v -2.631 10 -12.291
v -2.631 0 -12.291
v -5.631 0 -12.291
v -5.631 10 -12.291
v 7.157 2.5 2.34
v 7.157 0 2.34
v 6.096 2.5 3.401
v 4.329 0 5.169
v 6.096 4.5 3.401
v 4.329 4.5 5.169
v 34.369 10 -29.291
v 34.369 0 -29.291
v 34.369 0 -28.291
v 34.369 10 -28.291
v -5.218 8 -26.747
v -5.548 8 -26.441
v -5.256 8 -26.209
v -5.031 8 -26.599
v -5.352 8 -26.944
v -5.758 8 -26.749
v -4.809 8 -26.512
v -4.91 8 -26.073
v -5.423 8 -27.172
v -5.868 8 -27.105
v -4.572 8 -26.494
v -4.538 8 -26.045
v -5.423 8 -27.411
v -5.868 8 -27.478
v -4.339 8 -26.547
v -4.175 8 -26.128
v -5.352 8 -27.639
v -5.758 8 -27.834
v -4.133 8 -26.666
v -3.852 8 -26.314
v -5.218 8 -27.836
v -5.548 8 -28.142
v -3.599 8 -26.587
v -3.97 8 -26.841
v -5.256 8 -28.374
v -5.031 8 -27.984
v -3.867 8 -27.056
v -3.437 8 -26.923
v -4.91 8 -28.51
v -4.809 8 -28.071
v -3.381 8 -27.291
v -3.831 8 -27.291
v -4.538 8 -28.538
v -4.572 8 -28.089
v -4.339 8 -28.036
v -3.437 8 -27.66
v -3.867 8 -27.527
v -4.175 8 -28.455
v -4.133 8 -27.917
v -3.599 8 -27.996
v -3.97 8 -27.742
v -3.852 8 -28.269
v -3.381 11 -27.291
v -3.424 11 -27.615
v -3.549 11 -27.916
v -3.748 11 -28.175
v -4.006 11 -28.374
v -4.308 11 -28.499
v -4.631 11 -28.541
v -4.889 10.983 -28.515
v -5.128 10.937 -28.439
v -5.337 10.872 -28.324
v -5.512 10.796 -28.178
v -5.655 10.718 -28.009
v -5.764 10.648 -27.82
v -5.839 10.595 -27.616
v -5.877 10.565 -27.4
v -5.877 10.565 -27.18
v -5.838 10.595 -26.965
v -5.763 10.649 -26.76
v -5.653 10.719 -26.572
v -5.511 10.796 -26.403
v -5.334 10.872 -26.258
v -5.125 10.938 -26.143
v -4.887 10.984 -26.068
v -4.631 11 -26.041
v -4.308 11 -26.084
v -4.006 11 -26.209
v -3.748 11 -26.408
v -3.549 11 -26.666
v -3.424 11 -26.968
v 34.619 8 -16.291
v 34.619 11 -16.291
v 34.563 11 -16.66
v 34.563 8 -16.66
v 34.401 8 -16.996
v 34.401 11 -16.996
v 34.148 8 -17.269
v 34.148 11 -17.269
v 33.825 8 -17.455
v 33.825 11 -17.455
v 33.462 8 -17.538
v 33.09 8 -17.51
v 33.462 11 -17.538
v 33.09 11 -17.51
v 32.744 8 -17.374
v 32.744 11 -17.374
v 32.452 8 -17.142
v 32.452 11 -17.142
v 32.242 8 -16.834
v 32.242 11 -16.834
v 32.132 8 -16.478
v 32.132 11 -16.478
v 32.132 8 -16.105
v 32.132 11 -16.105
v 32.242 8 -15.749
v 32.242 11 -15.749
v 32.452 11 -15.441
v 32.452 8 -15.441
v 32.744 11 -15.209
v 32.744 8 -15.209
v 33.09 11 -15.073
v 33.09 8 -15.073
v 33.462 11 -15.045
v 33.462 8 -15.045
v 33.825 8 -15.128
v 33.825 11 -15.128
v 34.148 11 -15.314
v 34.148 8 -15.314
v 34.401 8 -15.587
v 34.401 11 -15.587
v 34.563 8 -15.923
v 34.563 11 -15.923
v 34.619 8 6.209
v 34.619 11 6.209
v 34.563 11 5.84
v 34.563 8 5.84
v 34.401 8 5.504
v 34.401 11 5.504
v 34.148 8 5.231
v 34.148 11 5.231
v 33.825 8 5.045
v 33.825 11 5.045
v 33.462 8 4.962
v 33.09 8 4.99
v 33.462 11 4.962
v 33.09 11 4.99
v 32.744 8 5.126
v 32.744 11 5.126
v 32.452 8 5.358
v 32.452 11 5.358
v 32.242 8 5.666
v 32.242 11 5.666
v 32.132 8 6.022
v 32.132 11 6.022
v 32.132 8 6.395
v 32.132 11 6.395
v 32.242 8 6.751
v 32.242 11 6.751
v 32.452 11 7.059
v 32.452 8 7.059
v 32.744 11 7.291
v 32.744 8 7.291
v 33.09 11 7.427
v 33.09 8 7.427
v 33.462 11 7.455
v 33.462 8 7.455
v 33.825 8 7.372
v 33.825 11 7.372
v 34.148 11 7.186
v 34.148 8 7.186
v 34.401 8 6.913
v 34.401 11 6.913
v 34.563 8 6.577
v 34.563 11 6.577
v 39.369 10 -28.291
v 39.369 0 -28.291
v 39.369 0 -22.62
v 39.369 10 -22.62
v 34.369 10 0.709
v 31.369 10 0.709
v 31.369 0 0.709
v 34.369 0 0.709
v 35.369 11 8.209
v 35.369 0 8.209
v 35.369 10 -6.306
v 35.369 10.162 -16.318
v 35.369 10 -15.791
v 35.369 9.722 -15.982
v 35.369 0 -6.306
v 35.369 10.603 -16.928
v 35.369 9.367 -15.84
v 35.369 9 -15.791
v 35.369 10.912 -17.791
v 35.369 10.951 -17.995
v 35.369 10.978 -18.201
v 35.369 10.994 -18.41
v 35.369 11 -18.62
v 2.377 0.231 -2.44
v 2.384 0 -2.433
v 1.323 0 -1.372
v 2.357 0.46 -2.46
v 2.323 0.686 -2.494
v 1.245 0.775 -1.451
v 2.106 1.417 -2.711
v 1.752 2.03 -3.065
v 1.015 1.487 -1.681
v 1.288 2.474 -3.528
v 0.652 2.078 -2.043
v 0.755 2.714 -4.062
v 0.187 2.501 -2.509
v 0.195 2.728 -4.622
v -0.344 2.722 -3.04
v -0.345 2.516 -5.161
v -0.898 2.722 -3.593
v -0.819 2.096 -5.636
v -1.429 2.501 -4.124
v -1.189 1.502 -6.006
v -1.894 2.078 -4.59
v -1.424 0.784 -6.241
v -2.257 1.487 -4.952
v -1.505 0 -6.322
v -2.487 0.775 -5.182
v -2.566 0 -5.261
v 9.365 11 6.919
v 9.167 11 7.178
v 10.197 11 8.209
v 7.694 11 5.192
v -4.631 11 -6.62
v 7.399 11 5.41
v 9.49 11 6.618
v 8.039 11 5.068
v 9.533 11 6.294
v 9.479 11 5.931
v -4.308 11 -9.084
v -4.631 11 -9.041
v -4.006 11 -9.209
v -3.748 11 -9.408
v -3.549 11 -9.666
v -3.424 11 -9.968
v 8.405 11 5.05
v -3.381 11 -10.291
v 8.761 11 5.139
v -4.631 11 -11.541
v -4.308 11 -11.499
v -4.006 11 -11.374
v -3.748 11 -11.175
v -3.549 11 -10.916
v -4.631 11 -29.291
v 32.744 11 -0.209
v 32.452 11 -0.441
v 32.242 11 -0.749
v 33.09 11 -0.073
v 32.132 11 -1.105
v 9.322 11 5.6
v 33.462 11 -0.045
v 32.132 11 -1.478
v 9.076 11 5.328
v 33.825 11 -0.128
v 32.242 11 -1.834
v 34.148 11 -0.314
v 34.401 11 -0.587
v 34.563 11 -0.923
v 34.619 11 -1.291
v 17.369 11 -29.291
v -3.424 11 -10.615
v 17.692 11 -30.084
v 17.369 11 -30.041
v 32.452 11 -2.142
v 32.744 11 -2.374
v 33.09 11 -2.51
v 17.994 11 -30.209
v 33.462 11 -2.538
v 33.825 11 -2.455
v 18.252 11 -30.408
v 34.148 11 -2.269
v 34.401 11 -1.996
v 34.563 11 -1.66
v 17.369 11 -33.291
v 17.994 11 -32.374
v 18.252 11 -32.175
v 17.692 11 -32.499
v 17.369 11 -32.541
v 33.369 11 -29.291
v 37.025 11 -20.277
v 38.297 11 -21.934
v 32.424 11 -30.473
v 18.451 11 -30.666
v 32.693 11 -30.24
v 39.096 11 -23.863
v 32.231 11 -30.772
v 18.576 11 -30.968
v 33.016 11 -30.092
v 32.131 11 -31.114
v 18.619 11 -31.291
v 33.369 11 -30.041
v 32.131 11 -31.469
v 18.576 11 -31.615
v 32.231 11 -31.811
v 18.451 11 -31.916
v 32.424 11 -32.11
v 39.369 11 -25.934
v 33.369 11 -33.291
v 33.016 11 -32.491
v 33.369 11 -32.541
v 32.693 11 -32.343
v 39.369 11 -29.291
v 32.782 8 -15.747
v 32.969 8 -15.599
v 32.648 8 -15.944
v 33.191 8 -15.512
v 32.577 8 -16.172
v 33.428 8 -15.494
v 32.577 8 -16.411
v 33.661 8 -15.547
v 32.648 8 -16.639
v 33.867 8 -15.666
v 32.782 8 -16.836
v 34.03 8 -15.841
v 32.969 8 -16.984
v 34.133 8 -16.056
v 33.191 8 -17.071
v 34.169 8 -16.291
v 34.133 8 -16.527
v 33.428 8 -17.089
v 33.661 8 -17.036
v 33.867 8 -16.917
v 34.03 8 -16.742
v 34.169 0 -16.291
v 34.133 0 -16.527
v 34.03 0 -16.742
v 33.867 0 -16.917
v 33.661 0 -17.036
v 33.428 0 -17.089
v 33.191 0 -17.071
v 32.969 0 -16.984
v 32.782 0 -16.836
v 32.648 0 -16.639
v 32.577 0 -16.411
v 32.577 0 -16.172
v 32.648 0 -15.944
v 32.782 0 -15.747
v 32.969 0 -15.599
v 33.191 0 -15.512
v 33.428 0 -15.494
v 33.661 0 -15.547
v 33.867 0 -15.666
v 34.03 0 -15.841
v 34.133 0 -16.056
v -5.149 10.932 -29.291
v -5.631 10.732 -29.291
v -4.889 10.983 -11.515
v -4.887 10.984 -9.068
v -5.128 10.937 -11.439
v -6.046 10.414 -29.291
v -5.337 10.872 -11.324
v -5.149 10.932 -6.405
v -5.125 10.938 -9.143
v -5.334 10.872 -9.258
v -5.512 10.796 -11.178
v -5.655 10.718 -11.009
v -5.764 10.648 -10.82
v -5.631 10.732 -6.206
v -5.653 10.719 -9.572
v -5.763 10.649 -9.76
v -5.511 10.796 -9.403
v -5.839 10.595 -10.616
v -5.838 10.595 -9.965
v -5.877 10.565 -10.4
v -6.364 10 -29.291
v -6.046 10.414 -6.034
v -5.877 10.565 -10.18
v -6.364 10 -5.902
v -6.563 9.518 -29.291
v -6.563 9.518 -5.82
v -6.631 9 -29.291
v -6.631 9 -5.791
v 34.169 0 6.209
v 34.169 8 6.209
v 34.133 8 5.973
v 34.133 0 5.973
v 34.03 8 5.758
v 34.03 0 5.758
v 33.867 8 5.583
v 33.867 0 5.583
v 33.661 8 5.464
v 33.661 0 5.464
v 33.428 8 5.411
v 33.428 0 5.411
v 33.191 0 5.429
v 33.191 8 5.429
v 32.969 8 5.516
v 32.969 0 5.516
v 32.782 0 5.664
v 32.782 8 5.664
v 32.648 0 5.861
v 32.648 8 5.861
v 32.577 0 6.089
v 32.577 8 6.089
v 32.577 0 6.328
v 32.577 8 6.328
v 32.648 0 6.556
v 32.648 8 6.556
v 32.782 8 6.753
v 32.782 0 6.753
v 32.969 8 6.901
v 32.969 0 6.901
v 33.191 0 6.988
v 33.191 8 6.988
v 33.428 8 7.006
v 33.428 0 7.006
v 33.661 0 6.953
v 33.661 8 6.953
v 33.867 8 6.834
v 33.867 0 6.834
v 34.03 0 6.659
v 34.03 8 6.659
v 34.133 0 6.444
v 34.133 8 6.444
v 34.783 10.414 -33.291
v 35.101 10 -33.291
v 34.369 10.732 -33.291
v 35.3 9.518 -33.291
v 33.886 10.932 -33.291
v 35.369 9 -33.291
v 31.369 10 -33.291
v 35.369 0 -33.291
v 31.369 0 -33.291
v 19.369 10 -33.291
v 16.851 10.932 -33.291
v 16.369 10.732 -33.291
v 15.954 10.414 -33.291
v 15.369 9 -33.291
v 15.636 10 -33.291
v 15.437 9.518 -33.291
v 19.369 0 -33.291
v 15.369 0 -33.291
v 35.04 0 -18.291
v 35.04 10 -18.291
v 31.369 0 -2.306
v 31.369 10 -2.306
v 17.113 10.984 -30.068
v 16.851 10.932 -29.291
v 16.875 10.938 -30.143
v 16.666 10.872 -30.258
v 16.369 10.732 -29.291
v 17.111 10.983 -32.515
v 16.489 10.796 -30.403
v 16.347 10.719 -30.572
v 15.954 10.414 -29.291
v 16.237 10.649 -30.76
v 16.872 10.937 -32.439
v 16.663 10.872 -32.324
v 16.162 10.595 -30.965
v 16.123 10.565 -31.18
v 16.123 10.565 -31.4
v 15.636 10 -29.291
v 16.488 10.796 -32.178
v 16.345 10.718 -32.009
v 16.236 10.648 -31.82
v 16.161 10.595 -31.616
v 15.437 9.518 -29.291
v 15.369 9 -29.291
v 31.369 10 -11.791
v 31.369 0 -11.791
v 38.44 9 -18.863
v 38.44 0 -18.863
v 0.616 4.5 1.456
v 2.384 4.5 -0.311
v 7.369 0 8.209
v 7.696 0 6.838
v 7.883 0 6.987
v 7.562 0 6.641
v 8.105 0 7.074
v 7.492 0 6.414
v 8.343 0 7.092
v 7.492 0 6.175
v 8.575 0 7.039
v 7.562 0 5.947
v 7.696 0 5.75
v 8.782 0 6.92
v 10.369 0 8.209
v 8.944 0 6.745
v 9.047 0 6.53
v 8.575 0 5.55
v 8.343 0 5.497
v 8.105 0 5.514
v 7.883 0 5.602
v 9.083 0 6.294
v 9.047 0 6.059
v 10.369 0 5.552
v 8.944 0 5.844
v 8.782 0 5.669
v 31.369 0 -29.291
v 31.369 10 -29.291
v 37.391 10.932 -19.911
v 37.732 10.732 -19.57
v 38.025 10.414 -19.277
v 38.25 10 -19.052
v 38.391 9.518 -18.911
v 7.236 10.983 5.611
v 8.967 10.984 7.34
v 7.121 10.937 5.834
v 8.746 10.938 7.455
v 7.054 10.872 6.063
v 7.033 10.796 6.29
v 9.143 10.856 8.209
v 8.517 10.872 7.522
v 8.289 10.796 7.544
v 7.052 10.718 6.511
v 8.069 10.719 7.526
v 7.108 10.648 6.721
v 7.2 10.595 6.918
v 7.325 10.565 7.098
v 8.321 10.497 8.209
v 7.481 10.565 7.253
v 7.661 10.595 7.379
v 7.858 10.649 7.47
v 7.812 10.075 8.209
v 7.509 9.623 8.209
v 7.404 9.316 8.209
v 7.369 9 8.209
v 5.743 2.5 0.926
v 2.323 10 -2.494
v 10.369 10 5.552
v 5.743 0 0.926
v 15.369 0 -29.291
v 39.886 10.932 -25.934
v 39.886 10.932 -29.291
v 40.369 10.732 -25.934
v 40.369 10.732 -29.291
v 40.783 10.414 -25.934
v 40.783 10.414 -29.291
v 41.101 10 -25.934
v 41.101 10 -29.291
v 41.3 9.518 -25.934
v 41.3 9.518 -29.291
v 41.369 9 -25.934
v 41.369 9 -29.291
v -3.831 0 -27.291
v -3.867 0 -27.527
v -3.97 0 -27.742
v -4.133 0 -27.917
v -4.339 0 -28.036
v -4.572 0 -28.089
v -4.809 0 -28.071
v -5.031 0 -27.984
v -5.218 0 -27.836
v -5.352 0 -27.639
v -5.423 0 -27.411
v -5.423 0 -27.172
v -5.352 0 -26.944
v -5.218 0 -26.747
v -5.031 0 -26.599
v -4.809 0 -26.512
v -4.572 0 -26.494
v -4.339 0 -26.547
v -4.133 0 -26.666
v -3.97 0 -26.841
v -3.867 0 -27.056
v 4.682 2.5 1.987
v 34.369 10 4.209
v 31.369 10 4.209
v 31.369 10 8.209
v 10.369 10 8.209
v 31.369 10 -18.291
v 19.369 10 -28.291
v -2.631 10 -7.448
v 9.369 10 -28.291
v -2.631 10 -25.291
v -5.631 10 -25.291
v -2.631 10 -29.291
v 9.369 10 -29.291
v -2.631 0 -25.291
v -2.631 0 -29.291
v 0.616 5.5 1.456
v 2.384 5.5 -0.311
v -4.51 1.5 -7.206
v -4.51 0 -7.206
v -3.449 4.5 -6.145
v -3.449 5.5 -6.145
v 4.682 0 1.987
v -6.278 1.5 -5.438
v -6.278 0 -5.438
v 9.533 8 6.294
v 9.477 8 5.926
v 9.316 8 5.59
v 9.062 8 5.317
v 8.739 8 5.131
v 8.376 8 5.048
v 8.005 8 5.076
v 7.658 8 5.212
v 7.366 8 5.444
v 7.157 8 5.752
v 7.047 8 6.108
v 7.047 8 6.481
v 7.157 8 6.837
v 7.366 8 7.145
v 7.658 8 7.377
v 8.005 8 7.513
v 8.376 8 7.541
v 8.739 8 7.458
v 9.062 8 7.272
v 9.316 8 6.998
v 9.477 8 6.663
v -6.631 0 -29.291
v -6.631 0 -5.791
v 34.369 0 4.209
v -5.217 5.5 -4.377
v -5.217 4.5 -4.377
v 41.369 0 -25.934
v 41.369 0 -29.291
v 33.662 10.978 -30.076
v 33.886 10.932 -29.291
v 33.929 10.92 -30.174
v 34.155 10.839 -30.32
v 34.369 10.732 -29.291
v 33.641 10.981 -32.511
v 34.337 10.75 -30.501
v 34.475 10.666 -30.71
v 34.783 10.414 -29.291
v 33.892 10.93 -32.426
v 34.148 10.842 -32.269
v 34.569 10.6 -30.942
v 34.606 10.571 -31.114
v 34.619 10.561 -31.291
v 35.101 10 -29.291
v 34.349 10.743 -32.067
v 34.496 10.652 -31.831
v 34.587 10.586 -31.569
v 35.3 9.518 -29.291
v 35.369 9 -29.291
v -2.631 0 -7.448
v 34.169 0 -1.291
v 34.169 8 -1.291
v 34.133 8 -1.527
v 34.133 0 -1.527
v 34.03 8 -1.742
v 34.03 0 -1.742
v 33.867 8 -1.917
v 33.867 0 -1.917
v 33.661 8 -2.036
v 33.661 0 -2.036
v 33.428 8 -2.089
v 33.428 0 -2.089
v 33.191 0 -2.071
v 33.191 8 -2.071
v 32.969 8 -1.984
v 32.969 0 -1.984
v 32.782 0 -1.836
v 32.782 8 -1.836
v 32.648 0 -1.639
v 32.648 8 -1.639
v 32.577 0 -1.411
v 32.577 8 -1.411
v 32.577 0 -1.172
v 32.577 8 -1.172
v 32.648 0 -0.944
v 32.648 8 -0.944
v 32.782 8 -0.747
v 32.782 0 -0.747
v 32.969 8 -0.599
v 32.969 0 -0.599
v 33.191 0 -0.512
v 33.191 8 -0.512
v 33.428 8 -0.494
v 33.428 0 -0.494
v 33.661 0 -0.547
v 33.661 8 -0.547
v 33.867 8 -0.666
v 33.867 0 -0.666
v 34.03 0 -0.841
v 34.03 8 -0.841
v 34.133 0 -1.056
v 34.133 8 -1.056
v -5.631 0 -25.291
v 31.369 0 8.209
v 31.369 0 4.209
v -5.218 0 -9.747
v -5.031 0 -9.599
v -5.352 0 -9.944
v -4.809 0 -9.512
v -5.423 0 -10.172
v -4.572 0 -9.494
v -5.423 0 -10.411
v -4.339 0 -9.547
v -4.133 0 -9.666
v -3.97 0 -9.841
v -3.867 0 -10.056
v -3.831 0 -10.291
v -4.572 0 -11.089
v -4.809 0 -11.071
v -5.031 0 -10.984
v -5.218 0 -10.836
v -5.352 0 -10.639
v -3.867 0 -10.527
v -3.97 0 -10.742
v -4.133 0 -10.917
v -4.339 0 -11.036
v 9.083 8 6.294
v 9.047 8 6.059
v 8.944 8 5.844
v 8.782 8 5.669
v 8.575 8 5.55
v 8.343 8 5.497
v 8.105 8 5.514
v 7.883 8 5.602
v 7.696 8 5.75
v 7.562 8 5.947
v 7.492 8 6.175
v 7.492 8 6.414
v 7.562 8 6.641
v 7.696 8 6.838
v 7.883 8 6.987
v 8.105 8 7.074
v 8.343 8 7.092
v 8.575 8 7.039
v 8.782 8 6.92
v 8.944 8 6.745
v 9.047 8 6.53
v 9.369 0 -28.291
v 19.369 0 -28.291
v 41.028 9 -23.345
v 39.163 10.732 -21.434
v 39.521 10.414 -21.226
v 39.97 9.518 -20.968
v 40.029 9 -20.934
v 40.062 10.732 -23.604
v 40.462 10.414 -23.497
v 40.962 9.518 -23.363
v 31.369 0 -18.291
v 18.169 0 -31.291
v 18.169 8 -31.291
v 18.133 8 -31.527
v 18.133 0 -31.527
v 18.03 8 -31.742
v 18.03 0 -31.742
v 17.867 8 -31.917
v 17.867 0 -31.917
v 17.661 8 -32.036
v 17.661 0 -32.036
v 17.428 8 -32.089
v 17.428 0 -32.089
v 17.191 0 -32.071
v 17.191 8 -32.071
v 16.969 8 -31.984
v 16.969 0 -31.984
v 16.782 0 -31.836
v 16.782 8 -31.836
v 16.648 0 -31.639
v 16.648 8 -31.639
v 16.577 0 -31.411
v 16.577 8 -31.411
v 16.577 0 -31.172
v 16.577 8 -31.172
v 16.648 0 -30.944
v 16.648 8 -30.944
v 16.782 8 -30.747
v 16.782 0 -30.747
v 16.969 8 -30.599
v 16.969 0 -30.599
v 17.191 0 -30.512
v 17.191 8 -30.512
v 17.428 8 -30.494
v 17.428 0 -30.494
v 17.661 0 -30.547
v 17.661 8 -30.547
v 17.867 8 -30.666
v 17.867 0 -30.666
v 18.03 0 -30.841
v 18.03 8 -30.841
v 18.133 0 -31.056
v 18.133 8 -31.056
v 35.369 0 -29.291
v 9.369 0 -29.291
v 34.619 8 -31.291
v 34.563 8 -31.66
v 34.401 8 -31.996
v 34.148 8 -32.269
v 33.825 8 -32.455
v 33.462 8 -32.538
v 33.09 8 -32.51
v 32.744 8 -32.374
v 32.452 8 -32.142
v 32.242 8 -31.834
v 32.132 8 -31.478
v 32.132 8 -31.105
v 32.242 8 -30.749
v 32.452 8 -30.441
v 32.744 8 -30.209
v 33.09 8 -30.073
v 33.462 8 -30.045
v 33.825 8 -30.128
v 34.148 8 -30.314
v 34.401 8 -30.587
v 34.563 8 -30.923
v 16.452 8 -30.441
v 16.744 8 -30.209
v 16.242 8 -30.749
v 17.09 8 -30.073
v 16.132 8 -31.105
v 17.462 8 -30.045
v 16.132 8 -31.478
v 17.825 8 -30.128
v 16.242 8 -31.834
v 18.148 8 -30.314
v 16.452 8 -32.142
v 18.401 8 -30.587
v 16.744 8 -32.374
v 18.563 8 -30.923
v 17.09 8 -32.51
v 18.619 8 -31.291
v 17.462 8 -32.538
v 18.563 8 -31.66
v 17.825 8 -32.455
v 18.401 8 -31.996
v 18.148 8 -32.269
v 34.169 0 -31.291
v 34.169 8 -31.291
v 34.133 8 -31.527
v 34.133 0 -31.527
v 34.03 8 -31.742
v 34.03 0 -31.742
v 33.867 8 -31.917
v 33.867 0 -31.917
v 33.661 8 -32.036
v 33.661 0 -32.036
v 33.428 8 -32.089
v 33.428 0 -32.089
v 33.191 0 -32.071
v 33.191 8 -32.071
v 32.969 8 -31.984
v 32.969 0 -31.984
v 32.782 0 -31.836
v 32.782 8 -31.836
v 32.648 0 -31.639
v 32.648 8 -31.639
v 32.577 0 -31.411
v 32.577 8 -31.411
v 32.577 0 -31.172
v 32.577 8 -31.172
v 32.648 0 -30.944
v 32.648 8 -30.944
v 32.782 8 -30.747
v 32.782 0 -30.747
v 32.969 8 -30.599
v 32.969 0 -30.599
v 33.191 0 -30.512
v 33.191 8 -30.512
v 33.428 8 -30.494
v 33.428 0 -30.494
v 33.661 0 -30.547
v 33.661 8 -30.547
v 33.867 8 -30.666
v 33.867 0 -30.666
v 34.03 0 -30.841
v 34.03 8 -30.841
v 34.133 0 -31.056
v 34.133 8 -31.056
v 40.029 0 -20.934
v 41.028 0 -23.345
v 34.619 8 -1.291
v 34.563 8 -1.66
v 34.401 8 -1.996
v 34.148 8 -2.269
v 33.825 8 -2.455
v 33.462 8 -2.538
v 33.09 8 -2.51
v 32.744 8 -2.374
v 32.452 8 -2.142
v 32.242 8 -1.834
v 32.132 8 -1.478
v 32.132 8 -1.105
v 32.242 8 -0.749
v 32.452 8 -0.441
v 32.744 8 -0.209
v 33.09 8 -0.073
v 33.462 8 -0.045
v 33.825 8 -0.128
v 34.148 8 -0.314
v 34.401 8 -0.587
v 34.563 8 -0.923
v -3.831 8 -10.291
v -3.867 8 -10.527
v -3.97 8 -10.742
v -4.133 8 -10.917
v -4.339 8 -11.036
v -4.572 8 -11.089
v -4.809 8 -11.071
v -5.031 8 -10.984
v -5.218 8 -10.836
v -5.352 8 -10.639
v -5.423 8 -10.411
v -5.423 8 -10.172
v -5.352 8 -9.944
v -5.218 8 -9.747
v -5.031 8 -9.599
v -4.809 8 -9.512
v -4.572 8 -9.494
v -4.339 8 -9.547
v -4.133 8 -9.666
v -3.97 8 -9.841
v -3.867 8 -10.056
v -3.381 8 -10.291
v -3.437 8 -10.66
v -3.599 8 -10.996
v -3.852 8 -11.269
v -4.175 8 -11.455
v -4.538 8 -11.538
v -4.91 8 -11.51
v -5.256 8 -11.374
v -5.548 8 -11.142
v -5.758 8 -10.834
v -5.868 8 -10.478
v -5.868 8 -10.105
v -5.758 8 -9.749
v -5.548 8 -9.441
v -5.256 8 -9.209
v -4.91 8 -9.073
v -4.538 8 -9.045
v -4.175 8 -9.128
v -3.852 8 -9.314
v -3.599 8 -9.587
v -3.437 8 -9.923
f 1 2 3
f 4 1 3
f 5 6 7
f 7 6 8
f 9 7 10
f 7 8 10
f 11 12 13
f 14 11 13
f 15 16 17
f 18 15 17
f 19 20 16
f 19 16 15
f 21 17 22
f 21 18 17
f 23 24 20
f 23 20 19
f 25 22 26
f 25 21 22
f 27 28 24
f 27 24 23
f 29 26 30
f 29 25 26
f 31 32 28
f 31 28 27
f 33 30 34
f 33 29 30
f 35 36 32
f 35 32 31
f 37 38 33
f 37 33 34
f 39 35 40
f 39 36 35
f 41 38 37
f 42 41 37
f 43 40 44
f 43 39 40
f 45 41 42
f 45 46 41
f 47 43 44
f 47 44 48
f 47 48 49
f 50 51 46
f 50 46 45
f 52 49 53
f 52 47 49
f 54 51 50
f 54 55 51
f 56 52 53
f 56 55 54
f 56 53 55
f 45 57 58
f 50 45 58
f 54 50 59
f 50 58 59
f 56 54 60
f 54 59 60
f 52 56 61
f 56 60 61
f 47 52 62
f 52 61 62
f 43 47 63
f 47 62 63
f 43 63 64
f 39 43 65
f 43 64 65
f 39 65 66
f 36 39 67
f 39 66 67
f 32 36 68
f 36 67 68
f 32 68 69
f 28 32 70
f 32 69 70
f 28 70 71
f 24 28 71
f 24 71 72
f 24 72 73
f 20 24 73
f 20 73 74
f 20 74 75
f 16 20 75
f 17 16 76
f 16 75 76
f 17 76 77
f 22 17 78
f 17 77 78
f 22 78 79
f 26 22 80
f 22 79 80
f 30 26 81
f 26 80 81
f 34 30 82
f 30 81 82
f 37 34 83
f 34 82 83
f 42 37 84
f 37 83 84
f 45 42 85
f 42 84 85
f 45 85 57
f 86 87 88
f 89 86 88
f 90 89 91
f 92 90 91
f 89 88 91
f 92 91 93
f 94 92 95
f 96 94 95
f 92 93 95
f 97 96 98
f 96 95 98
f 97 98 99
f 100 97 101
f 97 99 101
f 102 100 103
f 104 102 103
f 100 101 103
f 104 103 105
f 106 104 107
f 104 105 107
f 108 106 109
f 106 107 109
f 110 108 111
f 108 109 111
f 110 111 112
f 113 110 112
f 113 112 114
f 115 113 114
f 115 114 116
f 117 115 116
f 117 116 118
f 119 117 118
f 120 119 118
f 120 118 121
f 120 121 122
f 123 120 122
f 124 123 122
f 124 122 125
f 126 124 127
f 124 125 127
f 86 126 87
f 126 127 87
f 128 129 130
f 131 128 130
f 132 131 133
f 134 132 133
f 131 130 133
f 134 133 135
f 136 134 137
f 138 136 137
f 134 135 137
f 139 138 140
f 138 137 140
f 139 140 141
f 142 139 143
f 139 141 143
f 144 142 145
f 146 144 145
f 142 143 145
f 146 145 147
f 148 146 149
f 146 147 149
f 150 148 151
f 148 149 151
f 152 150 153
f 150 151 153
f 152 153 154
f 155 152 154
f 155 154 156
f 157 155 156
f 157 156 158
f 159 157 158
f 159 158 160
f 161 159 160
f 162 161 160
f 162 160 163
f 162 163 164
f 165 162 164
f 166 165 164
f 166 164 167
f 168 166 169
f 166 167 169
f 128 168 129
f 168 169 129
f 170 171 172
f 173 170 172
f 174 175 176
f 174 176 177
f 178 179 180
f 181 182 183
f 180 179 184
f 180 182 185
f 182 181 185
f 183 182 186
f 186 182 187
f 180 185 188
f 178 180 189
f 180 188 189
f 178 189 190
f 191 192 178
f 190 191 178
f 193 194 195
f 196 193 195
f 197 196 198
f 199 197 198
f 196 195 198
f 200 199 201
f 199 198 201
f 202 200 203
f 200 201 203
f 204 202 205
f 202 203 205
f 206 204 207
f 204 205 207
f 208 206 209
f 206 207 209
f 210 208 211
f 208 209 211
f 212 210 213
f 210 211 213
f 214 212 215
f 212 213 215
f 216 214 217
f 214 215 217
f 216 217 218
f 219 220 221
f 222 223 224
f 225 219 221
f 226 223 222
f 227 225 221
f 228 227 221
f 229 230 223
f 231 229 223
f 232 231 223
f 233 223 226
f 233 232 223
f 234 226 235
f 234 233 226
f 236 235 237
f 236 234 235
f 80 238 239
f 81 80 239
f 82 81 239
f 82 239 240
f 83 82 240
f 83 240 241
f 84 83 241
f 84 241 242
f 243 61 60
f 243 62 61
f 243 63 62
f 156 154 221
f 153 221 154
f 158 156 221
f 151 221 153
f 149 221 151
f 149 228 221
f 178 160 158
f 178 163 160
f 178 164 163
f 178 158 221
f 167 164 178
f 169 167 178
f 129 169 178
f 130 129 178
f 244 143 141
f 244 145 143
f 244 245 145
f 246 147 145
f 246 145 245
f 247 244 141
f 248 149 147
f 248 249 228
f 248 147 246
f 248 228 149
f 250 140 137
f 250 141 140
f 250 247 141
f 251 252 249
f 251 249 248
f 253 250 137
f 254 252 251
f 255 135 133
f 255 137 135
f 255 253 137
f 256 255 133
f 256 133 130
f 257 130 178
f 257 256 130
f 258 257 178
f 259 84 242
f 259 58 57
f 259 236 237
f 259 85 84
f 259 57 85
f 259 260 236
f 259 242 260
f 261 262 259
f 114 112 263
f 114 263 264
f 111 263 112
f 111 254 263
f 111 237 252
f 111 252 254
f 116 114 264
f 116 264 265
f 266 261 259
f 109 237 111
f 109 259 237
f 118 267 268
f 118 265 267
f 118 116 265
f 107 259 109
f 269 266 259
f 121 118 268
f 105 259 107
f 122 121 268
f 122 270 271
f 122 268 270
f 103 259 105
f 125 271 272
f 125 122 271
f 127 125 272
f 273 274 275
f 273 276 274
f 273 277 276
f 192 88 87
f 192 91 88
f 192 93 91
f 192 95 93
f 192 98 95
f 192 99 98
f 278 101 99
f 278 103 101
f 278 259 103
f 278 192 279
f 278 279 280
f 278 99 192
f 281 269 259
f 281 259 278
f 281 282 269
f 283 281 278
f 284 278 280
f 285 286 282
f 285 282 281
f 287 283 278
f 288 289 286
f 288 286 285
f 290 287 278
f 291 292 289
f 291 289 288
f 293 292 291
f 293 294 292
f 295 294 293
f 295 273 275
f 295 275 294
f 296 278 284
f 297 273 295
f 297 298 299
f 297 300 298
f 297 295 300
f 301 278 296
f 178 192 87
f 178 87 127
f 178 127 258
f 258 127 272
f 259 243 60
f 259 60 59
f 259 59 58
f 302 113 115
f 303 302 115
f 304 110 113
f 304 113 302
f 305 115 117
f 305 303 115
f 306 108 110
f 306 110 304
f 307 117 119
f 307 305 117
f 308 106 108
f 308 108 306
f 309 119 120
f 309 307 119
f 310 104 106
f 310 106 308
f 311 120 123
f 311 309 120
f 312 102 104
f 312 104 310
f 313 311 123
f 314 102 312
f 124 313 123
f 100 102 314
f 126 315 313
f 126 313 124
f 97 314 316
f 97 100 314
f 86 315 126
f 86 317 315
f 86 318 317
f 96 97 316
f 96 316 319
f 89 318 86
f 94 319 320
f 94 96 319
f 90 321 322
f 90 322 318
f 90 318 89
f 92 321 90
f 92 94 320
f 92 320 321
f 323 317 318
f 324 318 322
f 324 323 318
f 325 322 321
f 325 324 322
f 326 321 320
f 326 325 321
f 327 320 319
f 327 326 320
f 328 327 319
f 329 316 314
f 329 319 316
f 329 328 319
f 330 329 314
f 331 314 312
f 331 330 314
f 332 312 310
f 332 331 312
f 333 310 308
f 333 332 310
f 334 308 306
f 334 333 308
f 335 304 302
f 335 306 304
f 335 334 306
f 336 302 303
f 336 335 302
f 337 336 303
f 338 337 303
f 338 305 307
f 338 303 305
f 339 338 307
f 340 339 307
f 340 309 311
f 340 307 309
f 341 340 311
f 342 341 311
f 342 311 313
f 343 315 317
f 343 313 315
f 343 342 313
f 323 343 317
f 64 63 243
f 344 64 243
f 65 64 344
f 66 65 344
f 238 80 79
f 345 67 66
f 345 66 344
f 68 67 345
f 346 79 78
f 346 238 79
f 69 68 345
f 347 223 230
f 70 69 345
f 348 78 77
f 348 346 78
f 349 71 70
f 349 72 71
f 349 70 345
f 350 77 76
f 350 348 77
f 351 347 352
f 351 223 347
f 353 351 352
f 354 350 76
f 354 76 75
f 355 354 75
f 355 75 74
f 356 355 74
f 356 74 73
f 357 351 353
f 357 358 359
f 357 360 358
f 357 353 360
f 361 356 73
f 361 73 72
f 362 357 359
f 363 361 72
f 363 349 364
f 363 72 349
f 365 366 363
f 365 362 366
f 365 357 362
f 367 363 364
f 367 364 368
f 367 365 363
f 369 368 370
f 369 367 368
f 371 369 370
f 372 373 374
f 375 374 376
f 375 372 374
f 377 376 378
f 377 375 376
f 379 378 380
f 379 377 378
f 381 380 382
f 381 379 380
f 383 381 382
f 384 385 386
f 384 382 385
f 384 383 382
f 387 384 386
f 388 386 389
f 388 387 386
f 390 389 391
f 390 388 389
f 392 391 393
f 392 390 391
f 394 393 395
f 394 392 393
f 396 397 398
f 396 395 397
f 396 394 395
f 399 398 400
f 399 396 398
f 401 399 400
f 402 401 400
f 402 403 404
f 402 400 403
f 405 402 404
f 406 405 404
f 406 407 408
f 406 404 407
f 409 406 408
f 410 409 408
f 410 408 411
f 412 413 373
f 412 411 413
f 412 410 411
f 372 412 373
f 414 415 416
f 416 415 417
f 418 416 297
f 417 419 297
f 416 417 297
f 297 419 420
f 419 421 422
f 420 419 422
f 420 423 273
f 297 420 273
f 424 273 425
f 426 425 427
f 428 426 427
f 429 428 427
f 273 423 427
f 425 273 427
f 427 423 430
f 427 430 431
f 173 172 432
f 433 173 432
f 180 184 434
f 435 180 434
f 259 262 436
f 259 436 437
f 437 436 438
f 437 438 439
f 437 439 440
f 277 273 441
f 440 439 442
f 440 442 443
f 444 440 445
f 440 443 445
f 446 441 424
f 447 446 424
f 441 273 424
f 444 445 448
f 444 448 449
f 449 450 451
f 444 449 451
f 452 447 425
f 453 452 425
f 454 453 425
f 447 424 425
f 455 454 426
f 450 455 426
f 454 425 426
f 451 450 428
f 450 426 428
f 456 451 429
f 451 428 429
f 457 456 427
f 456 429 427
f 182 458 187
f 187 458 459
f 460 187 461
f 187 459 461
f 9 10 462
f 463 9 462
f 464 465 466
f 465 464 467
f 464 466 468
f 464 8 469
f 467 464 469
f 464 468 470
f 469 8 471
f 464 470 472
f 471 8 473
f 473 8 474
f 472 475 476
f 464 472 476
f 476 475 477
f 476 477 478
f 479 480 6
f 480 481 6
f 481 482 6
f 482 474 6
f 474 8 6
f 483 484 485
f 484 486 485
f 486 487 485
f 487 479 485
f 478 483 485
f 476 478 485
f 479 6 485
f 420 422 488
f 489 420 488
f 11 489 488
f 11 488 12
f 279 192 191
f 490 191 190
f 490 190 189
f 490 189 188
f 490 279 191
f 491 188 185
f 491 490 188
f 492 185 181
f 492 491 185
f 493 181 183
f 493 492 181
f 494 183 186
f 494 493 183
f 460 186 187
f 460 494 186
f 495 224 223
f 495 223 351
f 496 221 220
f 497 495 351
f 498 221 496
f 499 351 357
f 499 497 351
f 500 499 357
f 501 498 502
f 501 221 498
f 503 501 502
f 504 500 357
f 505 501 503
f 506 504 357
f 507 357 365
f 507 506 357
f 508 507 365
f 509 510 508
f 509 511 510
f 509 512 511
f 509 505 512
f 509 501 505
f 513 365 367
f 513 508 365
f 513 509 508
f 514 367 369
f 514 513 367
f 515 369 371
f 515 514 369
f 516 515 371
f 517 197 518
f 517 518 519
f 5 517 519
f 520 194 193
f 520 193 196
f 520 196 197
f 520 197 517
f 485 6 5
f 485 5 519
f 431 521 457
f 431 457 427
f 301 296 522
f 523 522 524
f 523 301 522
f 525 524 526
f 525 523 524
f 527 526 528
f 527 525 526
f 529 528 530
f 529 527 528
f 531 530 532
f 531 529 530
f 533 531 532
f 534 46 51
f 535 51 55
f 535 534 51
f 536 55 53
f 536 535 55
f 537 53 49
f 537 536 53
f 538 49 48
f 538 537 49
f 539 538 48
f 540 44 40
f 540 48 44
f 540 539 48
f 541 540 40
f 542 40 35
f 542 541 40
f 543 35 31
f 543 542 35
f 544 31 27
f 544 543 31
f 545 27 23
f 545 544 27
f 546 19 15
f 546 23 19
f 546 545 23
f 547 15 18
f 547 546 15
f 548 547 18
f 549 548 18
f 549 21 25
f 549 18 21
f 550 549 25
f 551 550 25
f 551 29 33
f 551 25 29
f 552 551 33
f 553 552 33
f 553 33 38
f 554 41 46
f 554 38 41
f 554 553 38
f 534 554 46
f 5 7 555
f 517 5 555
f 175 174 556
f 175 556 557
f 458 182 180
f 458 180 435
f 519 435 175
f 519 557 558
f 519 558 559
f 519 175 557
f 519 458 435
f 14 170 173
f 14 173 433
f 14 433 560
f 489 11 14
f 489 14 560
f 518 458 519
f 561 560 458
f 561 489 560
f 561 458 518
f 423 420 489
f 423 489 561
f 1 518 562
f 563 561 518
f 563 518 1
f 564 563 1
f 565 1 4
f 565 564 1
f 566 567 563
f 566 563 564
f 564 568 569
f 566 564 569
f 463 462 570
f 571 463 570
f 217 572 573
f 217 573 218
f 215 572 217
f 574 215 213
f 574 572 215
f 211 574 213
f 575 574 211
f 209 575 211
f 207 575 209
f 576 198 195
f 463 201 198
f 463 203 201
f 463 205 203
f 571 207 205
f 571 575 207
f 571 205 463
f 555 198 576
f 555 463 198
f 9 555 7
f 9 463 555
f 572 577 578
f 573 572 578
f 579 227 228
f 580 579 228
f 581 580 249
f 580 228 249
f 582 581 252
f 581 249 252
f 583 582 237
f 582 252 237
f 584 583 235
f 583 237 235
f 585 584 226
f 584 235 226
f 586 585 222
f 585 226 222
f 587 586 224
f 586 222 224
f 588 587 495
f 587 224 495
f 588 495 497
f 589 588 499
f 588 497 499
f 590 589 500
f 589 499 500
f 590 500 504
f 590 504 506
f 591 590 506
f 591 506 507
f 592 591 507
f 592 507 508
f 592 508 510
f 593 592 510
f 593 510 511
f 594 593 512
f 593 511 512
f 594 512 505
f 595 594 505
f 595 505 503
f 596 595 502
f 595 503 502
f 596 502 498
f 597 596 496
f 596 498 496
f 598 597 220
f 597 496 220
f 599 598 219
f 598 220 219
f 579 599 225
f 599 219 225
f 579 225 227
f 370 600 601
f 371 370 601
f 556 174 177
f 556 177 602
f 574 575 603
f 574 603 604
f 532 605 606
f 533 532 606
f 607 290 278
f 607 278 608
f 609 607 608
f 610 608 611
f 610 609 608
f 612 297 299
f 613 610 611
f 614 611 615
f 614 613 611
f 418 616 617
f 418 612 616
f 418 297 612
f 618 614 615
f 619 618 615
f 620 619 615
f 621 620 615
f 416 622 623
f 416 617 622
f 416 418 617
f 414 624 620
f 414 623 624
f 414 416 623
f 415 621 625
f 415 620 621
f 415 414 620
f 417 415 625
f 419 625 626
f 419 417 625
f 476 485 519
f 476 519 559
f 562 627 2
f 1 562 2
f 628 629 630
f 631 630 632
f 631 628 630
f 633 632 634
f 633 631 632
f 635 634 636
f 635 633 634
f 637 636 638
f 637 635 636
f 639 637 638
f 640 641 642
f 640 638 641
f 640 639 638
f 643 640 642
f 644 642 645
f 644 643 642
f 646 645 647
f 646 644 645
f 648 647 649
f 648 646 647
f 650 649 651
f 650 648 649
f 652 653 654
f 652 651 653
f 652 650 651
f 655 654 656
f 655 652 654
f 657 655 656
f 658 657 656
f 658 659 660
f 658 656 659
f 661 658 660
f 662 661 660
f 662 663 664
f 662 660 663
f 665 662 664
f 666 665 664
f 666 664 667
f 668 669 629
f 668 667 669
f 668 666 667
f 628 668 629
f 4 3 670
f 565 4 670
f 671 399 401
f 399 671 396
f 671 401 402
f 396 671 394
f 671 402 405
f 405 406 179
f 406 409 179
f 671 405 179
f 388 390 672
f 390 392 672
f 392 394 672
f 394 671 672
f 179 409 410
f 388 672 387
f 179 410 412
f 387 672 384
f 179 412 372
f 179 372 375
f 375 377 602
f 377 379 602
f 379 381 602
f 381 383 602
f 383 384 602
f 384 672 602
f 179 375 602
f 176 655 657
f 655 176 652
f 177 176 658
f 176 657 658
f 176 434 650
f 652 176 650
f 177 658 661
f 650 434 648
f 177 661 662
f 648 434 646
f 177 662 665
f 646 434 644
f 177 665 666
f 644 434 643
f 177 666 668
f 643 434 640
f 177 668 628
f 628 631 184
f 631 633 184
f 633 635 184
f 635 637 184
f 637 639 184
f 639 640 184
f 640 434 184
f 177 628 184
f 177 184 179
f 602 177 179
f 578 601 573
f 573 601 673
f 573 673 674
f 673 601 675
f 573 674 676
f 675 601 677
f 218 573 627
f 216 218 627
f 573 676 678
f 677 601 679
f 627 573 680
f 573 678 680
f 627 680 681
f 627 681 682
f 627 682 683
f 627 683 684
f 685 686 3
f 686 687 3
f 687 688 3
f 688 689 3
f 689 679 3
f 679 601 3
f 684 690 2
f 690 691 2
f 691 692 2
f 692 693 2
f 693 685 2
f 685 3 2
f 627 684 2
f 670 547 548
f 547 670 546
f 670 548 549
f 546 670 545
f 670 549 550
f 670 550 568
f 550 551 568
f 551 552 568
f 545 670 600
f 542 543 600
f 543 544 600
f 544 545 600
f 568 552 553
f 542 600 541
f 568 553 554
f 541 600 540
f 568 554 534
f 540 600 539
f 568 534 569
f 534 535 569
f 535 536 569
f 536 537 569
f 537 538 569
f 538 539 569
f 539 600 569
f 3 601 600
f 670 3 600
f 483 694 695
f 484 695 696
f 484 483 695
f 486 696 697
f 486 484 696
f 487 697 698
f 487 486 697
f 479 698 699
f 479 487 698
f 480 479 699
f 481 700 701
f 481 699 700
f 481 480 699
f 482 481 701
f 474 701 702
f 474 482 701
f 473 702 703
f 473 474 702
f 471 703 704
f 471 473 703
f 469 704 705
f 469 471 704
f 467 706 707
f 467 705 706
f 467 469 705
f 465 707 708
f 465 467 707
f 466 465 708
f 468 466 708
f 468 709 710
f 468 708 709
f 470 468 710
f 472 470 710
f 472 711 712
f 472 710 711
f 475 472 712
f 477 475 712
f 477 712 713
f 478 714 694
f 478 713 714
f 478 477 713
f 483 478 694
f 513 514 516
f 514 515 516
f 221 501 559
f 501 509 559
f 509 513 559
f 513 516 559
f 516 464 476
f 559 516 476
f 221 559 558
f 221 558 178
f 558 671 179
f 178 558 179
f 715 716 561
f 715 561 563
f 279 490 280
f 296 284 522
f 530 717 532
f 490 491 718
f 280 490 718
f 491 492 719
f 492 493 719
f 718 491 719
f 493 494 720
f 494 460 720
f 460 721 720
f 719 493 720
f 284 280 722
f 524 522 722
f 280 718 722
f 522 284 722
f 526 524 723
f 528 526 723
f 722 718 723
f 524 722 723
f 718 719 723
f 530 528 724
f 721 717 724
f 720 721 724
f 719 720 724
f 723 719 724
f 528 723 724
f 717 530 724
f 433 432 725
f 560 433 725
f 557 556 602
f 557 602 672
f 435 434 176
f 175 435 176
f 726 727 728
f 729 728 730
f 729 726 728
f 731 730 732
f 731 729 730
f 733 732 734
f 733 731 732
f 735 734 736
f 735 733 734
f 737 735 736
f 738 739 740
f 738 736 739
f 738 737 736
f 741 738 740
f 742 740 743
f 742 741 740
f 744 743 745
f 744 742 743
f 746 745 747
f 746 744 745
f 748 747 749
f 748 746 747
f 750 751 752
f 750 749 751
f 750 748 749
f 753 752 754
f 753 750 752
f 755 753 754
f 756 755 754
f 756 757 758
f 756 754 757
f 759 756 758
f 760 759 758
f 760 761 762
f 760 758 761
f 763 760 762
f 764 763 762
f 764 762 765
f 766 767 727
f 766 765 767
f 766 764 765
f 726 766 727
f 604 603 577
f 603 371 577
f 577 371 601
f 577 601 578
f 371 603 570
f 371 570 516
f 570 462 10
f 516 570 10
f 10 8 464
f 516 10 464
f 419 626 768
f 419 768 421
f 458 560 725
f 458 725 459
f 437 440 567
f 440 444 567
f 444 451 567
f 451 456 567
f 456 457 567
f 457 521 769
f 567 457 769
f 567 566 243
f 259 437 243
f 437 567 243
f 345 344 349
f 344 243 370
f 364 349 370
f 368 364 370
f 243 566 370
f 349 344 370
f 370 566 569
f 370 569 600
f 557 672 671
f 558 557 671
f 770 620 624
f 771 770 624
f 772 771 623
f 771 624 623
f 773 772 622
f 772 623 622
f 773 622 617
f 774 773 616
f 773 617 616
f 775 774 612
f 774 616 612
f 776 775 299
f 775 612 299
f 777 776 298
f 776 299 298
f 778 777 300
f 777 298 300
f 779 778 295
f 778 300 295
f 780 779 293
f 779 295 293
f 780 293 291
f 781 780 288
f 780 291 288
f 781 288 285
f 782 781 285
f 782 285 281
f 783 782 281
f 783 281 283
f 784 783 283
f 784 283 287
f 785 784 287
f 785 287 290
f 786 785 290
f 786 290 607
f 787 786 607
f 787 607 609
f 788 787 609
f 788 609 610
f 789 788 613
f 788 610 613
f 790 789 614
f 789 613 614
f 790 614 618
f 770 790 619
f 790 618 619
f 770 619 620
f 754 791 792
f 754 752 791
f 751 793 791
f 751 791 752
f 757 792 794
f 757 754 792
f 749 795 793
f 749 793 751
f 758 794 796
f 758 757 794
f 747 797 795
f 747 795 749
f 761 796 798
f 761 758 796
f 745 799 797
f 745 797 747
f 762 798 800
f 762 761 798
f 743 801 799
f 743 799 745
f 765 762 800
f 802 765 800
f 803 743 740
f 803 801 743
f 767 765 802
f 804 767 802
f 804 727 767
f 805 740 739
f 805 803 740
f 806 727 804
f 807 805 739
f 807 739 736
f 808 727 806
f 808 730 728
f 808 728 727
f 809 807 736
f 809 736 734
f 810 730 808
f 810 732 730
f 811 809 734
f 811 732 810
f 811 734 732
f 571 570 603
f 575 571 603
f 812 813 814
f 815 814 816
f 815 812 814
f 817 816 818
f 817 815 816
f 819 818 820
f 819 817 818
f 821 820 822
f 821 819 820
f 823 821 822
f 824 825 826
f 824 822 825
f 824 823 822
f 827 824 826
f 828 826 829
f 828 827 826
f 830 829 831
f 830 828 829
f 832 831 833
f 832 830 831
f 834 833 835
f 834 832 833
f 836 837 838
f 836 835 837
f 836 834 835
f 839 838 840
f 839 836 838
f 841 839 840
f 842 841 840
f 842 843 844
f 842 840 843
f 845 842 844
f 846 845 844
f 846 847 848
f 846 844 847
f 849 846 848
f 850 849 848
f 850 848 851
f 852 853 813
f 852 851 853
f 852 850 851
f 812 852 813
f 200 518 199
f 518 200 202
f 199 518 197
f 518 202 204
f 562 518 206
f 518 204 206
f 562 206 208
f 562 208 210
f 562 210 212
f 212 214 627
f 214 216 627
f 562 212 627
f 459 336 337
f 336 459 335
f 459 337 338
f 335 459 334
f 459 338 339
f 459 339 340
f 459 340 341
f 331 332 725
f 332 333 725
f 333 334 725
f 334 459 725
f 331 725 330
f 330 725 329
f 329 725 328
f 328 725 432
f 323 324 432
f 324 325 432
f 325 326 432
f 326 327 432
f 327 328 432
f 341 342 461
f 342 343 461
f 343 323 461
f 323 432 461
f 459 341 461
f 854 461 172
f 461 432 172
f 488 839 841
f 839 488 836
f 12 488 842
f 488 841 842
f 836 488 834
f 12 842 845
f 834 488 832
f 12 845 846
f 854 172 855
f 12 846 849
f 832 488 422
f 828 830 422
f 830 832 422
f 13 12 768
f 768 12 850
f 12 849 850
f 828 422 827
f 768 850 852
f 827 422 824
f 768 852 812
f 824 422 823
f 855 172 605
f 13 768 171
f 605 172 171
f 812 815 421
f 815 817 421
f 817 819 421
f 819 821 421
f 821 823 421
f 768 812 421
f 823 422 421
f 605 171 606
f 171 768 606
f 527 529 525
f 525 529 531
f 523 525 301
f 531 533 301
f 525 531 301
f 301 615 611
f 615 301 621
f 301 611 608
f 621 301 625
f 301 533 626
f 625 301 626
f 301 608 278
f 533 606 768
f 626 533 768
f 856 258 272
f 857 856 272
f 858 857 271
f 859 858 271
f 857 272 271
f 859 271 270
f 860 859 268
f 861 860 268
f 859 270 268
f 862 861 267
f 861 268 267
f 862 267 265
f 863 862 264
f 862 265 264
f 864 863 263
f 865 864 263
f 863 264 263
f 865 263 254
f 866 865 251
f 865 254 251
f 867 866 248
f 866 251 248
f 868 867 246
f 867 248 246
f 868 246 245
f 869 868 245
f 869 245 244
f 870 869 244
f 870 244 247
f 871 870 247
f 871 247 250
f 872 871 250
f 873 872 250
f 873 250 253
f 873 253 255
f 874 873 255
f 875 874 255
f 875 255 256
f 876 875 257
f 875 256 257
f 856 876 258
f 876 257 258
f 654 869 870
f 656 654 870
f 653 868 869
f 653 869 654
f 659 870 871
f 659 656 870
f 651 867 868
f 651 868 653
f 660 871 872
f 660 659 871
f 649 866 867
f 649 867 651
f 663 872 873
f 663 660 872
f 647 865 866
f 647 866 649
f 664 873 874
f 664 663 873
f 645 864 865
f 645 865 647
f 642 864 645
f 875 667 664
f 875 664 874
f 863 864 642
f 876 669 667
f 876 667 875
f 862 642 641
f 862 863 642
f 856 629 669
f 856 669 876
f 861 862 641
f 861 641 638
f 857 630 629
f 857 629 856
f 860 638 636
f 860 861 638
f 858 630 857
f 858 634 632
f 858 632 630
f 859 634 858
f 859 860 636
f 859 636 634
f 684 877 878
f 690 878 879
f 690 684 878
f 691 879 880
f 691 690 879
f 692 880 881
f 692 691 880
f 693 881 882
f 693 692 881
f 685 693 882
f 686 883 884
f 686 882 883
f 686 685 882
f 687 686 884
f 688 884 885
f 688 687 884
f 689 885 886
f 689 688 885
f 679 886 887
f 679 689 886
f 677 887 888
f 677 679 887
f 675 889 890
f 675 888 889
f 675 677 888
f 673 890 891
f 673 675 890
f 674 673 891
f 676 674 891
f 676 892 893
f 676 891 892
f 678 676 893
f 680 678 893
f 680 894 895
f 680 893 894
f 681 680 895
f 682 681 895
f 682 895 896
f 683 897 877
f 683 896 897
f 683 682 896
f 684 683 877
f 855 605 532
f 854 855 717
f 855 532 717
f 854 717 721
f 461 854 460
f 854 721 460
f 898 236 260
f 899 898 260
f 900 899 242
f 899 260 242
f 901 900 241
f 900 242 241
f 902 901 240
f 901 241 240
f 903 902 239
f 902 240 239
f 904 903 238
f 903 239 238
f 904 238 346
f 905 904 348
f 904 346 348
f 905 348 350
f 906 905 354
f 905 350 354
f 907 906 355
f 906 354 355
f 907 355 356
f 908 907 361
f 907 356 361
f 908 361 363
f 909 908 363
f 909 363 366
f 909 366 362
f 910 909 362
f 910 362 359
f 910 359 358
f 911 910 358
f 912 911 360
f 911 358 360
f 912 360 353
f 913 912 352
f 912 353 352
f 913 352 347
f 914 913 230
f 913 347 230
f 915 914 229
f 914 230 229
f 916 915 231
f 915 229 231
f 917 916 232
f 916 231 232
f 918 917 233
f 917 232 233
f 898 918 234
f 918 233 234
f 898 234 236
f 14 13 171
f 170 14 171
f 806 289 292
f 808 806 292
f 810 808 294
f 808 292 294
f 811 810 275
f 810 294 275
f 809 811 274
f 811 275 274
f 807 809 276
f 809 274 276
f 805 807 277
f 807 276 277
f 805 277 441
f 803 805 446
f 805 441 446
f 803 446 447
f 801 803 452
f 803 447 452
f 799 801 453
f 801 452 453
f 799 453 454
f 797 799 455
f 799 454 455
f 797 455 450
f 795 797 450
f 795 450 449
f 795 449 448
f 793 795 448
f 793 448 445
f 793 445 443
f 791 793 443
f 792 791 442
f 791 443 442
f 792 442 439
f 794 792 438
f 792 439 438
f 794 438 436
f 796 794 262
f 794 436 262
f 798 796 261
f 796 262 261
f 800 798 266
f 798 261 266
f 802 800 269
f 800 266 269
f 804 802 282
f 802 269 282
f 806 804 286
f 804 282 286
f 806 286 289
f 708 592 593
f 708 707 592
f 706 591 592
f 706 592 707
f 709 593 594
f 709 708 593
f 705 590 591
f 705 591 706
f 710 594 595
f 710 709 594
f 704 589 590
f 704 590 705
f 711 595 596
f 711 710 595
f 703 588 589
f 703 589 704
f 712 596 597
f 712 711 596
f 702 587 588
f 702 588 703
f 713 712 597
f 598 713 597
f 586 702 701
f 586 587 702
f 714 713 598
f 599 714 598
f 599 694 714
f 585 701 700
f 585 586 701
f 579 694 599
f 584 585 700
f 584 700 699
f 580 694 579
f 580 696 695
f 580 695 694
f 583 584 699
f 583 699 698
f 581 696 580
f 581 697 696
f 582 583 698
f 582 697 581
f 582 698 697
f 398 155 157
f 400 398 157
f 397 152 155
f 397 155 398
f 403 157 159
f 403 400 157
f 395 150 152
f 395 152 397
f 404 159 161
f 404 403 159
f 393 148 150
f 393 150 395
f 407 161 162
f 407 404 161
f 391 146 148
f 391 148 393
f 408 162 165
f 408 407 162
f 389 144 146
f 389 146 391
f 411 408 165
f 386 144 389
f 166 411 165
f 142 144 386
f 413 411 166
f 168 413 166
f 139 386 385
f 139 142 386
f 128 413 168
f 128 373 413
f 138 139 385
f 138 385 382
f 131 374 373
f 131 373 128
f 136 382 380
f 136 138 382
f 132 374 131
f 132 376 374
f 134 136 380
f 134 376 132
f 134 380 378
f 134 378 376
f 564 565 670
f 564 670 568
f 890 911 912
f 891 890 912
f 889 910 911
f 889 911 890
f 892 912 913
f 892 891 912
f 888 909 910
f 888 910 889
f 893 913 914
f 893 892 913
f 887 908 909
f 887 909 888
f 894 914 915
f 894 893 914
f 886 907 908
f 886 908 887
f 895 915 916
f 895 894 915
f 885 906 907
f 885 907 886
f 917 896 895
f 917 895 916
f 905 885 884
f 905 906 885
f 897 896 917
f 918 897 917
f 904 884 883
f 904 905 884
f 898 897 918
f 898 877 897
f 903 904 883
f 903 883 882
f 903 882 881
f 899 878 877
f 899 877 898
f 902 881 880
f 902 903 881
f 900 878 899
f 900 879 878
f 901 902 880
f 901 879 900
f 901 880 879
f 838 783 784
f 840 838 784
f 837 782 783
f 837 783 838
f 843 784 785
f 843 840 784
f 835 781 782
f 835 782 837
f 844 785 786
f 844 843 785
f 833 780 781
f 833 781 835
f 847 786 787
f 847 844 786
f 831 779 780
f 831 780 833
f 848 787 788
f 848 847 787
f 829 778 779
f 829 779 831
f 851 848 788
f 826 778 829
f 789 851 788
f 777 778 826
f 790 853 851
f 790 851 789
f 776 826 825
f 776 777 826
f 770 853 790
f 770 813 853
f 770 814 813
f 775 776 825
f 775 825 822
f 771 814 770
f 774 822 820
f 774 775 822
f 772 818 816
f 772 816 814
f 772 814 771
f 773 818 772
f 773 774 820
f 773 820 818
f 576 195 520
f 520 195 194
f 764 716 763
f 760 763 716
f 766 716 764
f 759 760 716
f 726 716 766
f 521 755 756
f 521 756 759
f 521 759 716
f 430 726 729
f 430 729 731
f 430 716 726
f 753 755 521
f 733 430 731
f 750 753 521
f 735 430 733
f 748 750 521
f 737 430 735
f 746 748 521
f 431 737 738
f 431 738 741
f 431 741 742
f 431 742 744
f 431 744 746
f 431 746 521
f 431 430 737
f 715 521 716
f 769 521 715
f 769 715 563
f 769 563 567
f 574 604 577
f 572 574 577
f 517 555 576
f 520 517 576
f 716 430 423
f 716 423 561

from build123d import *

# Parameters (mm, degrees)
BOSS_EXTRUDE2_DEPTH   = 11
BOSS_EXTRUDE2_2_DEPTH = 11
BOSS_EXTRUDE3_START   = 11
BOSS_EXTRUDE3_DEPTH   = 1
FILLET2_R             = 10
FILLET1_R             = 2
BOSS_EXTRUDE4_DEPTH   = 11
TUBE_HOLES_DEPTH      = 10
POT_INSERT_DEPTH      = 2.5
POT_START             = -2.5
SKETCH13_R            = 2.75
POT_HOLE_DEPTH        = 1.5
SKETCH7_R             = 0.8
SCREW_HOLES_DEPTH     = 12
SCREW_START           = 11
SKETCH12_R            = 1.25
SCREW_HEADS_DEPTH     = 3


with BuildPart() as part:
    # Sketch3 → Boss-Extrude2 (new body)
    with BuildSketch(Plane(origin=(0, 0, 0), x_dir=(1, 0, 0), z_dir=(0, 1, 0))):
        Polygon((-2.631461599, 29.291458176), (-6.631461599, 29.291458176), (-6.631461599, 5.791458176), (7.368538401, -8.208541824), (35.368538401, -8.208541824), (35.368538401, 15.791458176), (41.368538401, 21.791458176), (41.368538401, 29.291458179), (35.368538401, 29.291458179), (35.368538401, 33.291458176), (31.368538401, 33.291458176), (31.368538401, 29.291458176), (34.368538401, 29.291458176), (34.368538401, 28.291458176), (39.368538401, 28.291458176), (39.368538401, 22.619885301), (35.040111276, 18.291458176), (31.368538401, 18.291458176), (31.368538401, 11.791458176), (34.368538401, 14.791458176), (34.368538401, 5.306176806), (31.368538401, 2.306176806), (31.368538401, -0.708541824), (34.368538401, -0.708541824), (34.368538401, -4.208541824), (31.368538401, -4.208541824), (31.368538401, -7.208541824), (12.02539265, -7.208541824), (-2.631461599, 7.448312426), (-2.631461599, 12.291458176), (-5.631461599, 12.291458176), (-5.631461599, 25.291458176), (-2.631461599, 25.291458176), align=None)
    extrude(amount=BOSS_EXTRUDE2_DEPTH)



with BuildPart() as body_2:
    # Sketch3 → Boss-Extrude2 2 (new body)
    with BuildSketch(Plane(origin=(0, 0, 0), x_dir=(1, 0, 0), z_dir=(0, 1, 0))):
        Polygon((9.368538401, 29.291458176), (15.368538401, 29.291458176), (15.368538401, 33.291458176), (19.368538401, 33.291458176), (19.368538401, 28.291458176), (9.368538401, 28.291458176), align=None)
    extrude(amount=BOSS_EXTRUDE2_2_DEPTH)


with BuildPart() as part_1:
    add(part.part)

    add(body_2.part)  # Boss-Extrude3 merges body 2
    # Sketch5 → Boss-Extrude3 (add)
    with BuildSketch(Plane(origin=(0, 0, 0), x_dir=(1, 0, 0), z_dir=(0, 1, 0)).offset(BOSS_EXTRUDE3_START)):
        Polygon((-6.631461599, 29.291458176), (15.368538401, 29.291458176), (15.368538401, 33.291458176), (35.368538401, 33.291458176), (35.368538401, 29.291458179), (41.368538401, 29.291458179), (41.368538401, 21.791458176), (35.368538401, 15.791458176), (35.368538401, -8.208541824), (7.368538401, -8.208541824), (-6.631461599, 5.791458176), align=None)
    extrude(amount=-BOSS_EXTRUDE3_DEPTH)

    # Fillet2
    fillet2_edges = [part_1.edges().sort_by_distance(p)[0] for p in [
        (41.368538401, 5.5, -21.791458176),
    ]]
    fillet(fillet2_edges, radius=FILLET2_R)

    # Fillet1
    fillet1_edges = [part_1.edges().sort_by_distance(p)[0] for p in [
        (36.904072307, 11, -17.326992082),
        (41.368538401, 11, -27.61252599),
        (35.368538401, 11, -31.291458178),
        (15.368538401, 11, -31.291458176),
        (40.607333726, 11, -22.106759476),
        (-6.631461599, 11, -17.541458176),
        (0.368538401, 11, 1.208541824),
    ]]
    fillet(fillet1_edges, radius=FILLET1_R)

    # Sketch14 → Boss-Extrude4 (add)
    with BuildSketch(Plane(origin=(0, 0, 0), x_dir=(1, 0, 0), z_dir=(0, 1, 0))):
        Polygon((31.368538401, 11.791458176), (35.368538401, 15.791458176), (35.368538401, 17.791458176), (31.368538401, 13.791458176), align=None)
    extrude(amount=BOSS_EXTRUDE4_DEPTH)

    # Sketch10 → Tube Holes (cut)
    with BuildSketch(Plane(origin=(0, 0, 0), x_dir=(1, 0, 0), z_dir=(0, 1, 0))):
        Polygon((34.368538401, 5.306176806), (35.368538401, 6.306176806), (35.368538401, 15.791458176), (34.368538401, 14.791458176), align=None)
        Polygon((10.368538401, -5.551687574), (10.368538401, -8.208541824), (31.368538401, -8.208541824), (31.368538401, -3.516153668), (17.52539265, -3.516153668), (6.918790933, 7.09044805), (2.322596855, 2.494253972), align=None)
    extrude(amount=TUBE_HOLES_DEPTH, mode=Mode.SUBTRACT)

    # Sketch9 → Pot Insert (cut)
    with BuildSketch(Plane(origin=(-0.420001711, 0, 0.420001711), x_dir=(0.707106781, 0, 0.707106781), z_dir=(-0.707106781, 0, 0.707106781))):
        Polygon((-8.284330815, 0), (-8.284330815, -1.5), (-6.784330815, -4.5), (-6.784330815, -5.5), (-2.784330815, -5.5), (1.465669185, -5.5), (1.465669185, -4.5), (6.715669185, -4.5), (6.715669185, 0), align=None)
        Polygon((-8.284330815, 1.5), (-8.284330815, 0), (6.715669185, 0), (6.715669185, 4.5), (1.465669185, 4.5), (1.465669185, 5.5), (-2.784330815, 5.5), (-6.784330815, 5.5), (-6.784330815, 4.5), align=None)
    extrude(amount=-POT_INSERT_DEPTH, mode=Mode.SUBTRACT)

    # Sketch13 → Pot Hole (cut)
    with BuildSketch(Plane(origin=(-0.420001711, 0, 0.420001711), x_dir=(0.707106781, 0, 0.707106781), z_dir=(-0.707106781, 0, 0.707106781)).offset(POT_START)):
        with Locations((-2.784330815, 0)):
            Circle(SKETCH13_R)
        Polygon((6.715669185, 0), (6.715669185, 2.5), (4.715669185, 2.5), (4.715669185, -2.5), (6.715669185, -2.5), align=None)
    extrude(amount=-POT_HOLE_DEPTH, mode=Mode.SUBTRACT)

    # Sketch7 → Screw Holes (cut, through all)
    with BuildSketch(Plane(origin=(0, 0, 0), x_dir=(1, 0, 0), z_dir=(0, 1, 0))):
        with Locations((-4.631461599, 27.291458176)):
            Circle(SKETCH7_R)
        with Locations((17.368538401, 31.291458176)):
            Circle(SKETCH7_R)
        with Locations((33.368538401, 31.291458176)):
            Circle(SKETCH7_R)
        with Locations((-4.631461599, 10.291458176)):
            Circle(SKETCH7_R)
        with Locations((33.368538401, 16.291458176)):
            Circle(SKETCH7_R)
        with Locations((8.282751963, -6.294328261)):
            Circle(SKETCH7_R)
        with Locations((33.368538401, 1.291458176)):
            Circle(SKETCH7_R)
        with Locations((33.368538401, -6.208541824)):
            Circle(SKETCH7_R)
    extrude(amount=SCREW_HOLES_DEPTH, mode=Mode.SUBTRACT)

    # Sketch12 → Screw Heads (cut)
    with BuildSketch(Plane(origin=(0, 0, 0), x_dir=(1, 0, 0), z_dir=(0, 1, 0)).offset(SCREW_START)):
        with Locations((-4.631461599, 27.291458176)):
            Circle(SKETCH12_R)
        with Locations((17.368538401, 31.291458176)):
            Circle(SKETCH12_R)
        with Locations((33.368538401, 31.291458176)):
            Circle(SKETCH12_R)
        with Locations((-4.631461599, 10.291458176)):
            Circle(SKETCH12_R)
        with Locations((33.368538401, 16.291458176)):
            Circle(SKETCH12_R)
        with Locations((8.282751963, -6.294328261)):
            Circle(SKETCH12_R)
        with Locations((33.368538401, 1.291458176)):
            Circle(SKETCH12_R)
        with Locations((33.368538401, -6.208541824)):
            Circle(SKETCH12_R)
    extrude(amount=-SCREW_HEADS_DEPTH, mode=Mode.SUBTRACT)


solid = part_1.part
